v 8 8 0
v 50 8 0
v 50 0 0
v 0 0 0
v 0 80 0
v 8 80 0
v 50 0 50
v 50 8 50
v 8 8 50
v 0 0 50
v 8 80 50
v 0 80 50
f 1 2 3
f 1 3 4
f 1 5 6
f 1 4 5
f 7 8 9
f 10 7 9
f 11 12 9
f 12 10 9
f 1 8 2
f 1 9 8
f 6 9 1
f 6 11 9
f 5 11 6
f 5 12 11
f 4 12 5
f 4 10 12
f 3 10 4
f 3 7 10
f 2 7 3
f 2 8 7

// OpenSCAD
$fn = 32;

// ----------------------------------------------------------------------
// Structural section: angle 50 x 80 mm
// ----------------------------------------------------------------------

// --- parameters (mm) ---
sec_w = 50;               // leg width, X
sec_h = 80;               // leg height, Y
flange_t = 8;             // leg thickness
plate_t = 50;             // cut length, Z (extrusion height)

profile = [[0, 0], [50, 0], [50, 8], [8, 8], [8, 80], [0, 80]];  // primary outline, 6 points, counter clockwise

// --- the one profile operation ---
linear_extrude(height = plate_t) polygon(points = profile);
